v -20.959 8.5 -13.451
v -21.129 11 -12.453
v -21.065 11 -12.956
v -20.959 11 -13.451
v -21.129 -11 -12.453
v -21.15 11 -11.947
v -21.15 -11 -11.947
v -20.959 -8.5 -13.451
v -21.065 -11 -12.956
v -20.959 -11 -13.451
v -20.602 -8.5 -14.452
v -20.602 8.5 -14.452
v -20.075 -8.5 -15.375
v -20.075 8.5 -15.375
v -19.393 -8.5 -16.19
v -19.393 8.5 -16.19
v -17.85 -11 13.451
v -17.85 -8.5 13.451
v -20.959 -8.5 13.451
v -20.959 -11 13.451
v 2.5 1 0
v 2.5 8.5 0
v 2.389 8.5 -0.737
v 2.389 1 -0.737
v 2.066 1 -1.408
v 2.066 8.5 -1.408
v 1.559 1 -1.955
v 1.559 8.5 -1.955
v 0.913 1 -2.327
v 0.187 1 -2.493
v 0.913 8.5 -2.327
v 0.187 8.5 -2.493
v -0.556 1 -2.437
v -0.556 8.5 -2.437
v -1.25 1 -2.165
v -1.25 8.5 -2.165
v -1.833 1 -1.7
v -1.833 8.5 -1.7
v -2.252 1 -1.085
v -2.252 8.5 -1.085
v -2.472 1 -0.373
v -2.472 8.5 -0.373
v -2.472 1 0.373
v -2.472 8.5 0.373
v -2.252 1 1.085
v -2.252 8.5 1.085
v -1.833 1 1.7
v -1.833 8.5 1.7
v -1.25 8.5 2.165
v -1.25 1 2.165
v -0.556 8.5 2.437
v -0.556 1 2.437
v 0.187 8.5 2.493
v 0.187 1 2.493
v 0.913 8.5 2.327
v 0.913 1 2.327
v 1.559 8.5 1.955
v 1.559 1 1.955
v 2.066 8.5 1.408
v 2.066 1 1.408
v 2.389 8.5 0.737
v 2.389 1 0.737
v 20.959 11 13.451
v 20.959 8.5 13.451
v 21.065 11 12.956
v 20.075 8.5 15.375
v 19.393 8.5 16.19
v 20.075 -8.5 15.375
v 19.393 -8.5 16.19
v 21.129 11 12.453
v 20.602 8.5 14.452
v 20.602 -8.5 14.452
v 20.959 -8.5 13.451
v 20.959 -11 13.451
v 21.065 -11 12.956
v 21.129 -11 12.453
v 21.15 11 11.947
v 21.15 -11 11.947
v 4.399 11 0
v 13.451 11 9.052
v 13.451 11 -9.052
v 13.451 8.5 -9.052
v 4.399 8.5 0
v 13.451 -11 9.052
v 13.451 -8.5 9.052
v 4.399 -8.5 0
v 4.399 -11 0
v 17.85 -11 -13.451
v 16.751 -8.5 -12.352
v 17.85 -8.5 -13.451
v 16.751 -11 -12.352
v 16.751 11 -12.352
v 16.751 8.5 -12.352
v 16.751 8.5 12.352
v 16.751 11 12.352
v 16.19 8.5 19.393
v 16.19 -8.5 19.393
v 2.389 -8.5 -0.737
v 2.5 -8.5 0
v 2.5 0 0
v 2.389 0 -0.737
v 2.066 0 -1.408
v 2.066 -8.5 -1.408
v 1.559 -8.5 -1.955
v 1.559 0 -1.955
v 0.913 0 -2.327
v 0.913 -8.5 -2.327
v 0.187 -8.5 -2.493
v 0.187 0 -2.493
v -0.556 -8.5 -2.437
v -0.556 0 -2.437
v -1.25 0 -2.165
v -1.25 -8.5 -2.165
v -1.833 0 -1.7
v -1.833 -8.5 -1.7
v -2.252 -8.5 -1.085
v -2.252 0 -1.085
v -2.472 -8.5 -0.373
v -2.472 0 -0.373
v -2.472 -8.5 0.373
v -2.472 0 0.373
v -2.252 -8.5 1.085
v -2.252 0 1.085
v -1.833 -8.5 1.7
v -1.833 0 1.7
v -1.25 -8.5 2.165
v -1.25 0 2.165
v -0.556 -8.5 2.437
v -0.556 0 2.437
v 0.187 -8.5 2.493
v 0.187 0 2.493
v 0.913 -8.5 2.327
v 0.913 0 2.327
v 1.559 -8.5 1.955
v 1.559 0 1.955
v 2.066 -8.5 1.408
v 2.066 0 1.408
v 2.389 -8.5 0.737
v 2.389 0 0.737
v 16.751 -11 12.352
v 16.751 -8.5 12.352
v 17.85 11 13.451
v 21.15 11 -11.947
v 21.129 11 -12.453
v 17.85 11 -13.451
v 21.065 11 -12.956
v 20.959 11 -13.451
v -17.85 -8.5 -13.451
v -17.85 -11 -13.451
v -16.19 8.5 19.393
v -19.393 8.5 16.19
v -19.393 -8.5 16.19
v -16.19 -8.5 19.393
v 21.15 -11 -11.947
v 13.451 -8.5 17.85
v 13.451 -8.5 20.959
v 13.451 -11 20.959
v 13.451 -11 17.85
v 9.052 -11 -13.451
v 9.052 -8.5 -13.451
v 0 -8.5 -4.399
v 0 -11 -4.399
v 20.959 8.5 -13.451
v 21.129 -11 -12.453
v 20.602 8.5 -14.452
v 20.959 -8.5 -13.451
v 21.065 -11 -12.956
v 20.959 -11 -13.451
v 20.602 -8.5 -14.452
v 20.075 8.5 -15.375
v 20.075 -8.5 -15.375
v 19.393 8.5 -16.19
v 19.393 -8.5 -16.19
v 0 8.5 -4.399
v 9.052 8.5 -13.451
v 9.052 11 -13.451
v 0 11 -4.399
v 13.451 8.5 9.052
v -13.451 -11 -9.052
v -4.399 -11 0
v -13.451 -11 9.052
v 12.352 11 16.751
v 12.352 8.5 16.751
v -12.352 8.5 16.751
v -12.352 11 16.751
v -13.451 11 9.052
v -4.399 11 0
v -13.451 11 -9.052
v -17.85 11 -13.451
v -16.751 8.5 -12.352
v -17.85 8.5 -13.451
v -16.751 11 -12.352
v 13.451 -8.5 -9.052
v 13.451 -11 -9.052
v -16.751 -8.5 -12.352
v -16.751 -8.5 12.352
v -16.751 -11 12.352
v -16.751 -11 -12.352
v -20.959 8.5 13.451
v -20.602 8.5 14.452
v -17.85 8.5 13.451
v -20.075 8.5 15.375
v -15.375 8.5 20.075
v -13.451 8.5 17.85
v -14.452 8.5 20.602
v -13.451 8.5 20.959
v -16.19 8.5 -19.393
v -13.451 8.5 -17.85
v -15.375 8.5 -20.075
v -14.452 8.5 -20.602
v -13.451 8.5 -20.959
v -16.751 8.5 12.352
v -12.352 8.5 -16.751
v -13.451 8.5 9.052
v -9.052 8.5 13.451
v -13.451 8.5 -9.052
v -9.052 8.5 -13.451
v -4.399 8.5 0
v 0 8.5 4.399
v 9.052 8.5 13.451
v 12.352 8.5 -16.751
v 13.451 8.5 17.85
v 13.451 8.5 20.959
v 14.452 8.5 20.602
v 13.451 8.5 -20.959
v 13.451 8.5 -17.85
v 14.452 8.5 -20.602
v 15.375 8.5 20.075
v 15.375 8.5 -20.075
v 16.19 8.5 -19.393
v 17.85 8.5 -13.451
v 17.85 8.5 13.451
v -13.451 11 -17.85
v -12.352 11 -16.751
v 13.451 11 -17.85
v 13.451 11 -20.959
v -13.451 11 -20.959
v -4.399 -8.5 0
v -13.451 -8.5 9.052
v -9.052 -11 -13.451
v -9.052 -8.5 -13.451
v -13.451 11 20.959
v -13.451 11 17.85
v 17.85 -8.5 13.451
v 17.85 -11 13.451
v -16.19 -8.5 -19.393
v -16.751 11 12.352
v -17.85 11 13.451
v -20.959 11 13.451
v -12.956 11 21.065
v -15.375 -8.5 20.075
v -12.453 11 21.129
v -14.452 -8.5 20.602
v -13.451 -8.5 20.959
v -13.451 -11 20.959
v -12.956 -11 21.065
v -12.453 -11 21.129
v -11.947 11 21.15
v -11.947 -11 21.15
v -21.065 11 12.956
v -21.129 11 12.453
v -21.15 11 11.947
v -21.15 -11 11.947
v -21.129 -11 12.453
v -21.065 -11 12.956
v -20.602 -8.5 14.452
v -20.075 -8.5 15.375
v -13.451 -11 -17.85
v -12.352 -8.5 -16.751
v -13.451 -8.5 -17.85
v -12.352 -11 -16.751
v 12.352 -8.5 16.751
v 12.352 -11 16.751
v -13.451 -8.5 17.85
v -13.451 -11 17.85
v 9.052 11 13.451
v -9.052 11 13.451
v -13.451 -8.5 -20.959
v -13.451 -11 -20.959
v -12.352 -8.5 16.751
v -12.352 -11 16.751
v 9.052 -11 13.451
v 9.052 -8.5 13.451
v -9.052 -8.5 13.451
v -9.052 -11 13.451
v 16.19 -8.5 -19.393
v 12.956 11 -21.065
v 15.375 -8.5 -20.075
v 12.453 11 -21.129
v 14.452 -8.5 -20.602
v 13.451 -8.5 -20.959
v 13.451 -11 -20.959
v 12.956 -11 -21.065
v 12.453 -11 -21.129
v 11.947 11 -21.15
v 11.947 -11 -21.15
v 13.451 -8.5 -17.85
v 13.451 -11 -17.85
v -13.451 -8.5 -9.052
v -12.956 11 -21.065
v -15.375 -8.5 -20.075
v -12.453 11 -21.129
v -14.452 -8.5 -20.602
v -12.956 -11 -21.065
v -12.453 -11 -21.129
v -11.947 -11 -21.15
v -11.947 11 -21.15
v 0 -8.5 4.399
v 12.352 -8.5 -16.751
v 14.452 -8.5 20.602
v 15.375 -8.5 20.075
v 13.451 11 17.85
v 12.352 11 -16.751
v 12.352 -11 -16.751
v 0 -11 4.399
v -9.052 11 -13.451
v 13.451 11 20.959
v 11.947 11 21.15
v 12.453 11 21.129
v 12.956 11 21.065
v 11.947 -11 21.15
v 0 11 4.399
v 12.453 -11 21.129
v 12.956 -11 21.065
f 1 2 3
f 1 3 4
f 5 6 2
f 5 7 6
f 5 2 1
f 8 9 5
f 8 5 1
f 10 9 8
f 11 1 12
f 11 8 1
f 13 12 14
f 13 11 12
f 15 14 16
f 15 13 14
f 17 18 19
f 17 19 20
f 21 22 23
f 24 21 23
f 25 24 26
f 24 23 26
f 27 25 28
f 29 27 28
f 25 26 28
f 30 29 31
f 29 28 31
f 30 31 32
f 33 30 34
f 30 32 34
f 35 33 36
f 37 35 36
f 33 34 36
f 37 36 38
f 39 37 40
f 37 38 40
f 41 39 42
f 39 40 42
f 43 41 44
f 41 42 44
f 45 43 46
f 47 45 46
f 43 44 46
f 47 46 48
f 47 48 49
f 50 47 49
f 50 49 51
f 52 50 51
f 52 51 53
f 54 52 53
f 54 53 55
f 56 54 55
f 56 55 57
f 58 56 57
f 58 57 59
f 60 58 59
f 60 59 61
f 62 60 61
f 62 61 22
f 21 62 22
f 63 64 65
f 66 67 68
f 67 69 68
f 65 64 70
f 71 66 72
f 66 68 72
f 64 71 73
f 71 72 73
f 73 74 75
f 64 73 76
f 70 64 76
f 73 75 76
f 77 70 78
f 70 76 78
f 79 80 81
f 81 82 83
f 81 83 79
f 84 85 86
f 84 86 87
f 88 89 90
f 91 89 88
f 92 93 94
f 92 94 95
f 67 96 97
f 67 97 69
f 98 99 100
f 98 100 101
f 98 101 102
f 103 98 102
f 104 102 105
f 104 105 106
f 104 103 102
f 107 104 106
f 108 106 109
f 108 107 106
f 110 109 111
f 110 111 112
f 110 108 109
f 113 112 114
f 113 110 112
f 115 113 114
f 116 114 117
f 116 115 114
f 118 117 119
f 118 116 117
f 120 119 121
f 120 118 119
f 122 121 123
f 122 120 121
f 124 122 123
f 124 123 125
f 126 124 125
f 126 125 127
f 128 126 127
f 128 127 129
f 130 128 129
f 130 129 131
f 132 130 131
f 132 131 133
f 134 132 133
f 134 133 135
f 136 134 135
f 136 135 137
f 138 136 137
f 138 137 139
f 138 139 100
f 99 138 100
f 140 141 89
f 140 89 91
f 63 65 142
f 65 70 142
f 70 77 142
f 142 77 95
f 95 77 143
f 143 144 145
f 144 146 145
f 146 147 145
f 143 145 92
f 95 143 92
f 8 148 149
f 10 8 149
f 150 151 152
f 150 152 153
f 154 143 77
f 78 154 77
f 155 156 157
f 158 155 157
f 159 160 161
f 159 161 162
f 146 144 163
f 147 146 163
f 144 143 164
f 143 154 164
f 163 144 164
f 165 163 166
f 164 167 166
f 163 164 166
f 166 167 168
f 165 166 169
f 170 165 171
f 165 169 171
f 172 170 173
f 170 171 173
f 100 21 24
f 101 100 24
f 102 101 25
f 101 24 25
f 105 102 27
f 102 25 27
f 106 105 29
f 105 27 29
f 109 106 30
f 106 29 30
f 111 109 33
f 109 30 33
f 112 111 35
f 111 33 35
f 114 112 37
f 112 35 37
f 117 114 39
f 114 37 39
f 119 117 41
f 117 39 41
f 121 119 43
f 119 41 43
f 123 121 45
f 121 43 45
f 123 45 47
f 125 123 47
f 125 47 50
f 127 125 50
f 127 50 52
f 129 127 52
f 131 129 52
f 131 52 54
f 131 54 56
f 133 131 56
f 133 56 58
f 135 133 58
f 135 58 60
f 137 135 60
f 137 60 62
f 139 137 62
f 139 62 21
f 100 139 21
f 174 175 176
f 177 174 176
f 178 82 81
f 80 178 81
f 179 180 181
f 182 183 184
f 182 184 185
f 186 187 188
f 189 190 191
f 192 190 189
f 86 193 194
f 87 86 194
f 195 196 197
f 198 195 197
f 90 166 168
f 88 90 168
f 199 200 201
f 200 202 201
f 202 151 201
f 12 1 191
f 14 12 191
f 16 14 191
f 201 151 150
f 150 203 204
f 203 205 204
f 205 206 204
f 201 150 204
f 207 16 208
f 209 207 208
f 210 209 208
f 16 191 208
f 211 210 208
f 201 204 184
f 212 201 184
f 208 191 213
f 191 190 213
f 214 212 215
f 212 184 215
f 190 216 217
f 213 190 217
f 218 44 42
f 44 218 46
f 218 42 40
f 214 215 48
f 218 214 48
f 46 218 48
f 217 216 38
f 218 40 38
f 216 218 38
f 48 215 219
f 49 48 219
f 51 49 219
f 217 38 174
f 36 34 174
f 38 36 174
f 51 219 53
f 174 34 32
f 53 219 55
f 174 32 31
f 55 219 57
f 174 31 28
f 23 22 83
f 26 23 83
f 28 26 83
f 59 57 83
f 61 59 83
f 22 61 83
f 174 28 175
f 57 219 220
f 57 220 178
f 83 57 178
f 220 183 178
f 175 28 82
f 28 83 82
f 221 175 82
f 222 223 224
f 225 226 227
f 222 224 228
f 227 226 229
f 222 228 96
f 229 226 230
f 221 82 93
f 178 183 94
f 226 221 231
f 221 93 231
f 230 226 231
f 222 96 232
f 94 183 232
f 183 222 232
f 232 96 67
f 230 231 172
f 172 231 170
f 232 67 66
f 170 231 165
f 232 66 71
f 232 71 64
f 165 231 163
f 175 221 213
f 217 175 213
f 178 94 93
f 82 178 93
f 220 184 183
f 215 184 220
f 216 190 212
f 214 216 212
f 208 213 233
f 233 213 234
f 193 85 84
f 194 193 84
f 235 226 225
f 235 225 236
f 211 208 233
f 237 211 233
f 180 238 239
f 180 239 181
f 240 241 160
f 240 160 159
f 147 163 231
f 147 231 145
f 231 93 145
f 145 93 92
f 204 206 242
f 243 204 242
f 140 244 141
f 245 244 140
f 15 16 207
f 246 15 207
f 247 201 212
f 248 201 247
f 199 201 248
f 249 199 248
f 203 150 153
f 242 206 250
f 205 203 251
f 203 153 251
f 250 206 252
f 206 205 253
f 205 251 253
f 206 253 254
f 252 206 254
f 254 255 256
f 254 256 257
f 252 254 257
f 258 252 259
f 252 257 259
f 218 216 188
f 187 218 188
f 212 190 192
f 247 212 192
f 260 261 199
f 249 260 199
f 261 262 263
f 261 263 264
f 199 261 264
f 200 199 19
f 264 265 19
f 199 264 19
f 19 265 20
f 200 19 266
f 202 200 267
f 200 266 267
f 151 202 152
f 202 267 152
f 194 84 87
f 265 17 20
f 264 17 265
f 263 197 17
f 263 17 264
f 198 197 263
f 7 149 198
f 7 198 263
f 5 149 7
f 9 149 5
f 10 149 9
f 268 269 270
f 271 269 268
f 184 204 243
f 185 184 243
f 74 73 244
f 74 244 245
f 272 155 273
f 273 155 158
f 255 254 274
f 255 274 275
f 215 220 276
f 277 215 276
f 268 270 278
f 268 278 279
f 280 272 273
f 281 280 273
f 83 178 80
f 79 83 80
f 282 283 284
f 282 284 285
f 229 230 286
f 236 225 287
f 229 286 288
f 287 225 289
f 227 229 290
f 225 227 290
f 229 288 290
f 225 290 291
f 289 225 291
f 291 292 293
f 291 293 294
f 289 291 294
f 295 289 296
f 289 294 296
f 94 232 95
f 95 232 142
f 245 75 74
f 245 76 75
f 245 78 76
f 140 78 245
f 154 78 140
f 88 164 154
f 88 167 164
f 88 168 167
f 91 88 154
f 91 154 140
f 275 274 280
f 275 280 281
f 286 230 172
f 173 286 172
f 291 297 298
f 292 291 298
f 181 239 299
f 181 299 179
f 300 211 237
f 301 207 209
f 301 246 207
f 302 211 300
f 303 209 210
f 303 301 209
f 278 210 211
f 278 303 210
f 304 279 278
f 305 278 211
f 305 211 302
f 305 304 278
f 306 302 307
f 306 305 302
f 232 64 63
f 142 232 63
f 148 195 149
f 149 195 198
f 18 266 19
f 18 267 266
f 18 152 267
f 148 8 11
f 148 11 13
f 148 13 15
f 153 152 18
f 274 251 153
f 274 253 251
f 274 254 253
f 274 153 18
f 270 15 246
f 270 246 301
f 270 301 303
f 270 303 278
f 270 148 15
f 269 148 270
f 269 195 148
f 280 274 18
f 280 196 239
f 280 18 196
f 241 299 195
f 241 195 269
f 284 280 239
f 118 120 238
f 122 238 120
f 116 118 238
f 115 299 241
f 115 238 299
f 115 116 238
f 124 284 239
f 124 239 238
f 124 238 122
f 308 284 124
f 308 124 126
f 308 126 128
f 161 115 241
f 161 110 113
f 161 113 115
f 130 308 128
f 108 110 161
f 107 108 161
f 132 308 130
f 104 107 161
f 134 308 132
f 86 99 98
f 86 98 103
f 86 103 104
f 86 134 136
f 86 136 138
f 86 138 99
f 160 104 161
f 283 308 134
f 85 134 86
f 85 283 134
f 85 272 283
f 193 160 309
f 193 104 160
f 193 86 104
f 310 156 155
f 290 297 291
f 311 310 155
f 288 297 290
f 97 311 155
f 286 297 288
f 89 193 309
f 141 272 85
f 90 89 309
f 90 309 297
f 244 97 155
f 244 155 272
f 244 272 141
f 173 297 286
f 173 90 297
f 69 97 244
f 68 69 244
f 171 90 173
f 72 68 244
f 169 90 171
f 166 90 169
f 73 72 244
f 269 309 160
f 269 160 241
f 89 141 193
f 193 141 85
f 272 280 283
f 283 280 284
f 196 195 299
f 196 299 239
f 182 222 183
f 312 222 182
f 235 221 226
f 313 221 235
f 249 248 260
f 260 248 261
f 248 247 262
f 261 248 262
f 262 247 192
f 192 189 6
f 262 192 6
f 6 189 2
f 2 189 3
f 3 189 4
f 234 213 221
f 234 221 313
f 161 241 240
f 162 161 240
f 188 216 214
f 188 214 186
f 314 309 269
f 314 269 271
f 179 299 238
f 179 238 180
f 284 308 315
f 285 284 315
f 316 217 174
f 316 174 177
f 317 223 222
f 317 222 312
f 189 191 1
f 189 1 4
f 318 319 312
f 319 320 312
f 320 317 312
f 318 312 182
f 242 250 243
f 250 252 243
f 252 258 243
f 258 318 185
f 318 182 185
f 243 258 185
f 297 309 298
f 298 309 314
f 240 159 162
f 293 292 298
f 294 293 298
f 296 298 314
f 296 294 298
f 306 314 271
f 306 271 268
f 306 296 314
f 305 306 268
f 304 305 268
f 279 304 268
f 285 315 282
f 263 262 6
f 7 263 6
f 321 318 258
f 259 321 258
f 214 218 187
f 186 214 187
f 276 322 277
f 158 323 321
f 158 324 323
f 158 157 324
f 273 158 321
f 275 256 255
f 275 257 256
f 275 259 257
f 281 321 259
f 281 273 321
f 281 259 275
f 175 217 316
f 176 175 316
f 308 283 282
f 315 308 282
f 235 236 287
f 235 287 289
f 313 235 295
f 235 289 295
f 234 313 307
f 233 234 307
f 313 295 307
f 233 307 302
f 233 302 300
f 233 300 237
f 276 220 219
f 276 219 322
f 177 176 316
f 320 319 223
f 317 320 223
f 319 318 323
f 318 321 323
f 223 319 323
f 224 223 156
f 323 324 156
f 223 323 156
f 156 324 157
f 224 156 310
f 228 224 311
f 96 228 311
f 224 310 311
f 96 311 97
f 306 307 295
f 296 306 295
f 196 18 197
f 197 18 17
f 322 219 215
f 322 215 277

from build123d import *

# Parameters (mm, degrees)
BOSS_EXTRUDE1_DEPTH = 11
SKETCH18_W          = 3.3
SKETCH18_H          = 2.5
CUT_EXTRUDE10_DEPTH = 43.3
SKETCH19_W          = 3.3
SKETCH19_H          = 2.5
CUT_EXTRUDE11_DEPTH = 43.3
SKETCH20_W          = 6.221233688
SKETCH20_H          = 2.5
CUT_EXTRUDE12_DEPTH = 57.710616844
SKETCH21_W          = 6.221233688
SKETCH21_H          = 2.5
CUT_EXTRUDE13_DEPTH = 57.710616844
SKETCH22_R          = 2.5
CUT_EXTRUDE14_DEPTH = 9.5
CUT_EXTRUDE15_DEPTH = 20.5
FILLET8_R           = 6


with BuildPart() as part:
    # Sketch1 → Boss-Extrude1 (new body)
    with BuildSketch(Plane(origin=(0, 0, 0), x_dir=(1, 0, 0), z_dir=(0, 1, 0))):
        Polygon((-21.15, 16.750923472), (-16.750923472, 21.15), (16.750923472, 21.15), (21.15, 16.750923472), (21.15, -16.750923472), (16.750923472, -21.15), (-16.750923472, -21.15), (-21.15, -16.750923472), align=None)
    boss_extrude1 = extrude(amount=BOSS_EXTRUDE1_DEPTH)

    # Sketch18 → Cut-Extrude10 (cut, through all)
    with BuildSketch(Plane.XY.offset(21.15)):
        with Locations((15.100923472, 9.75)):
            Rectangle(SKETCH18_W, SKETCH18_H)
        with Locations((-15.100923472, 9.75)):
            Rectangle(SKETCH18_W, SKETCH18_H)
    cut_extrude10 = extrude(amount=-CUT_EXTRUDE10_DEPTH, mode=Mode.SUBTRACT)

    # Sketch19 → Cut-Extrude11 (cut, through all)
    with BuildSketch(Plane(origin=(21.15, 0, 0), x_dir=(0, 0, -1), z_dir=(1, 0, 0))):
        with Locations((-15.100923472, 9.75)):
            Rectangle(SKETCH19_W, SKETCH19_H)
        with Locations((15.100923472, 9.75)):
            Rectangle(SKETCH19_W, SKETCH19_H)
    cut_extrude11 = extrude(amount=-CUT_EXTRUDE11_DEPTH, mode=Mode.SUBTRACT)

    # Sketch20 → Cut-Extrude12 (cut, through all)
    with BuildSketch(Plane(origin=(18.950461736, 0, 18.950461736), x_dir=(0.707106781, 0, -0.707106781), z_dir=(0.707106781, 0, 0.707106781))):
        with Locations((0, 9.75)):
            Rectangle(SKETCH20_W, SKETCH20_H)
    cut_extrude12 = extrude(amount=-CUT_EXTRUDE12_DEPTH, mode=Mode.SUBTRACT)

    # Sketch21 → Cut-Extrude13 (cut, through all)
    with BuildSketch(Plane(origin=(-18.950461736, 0, 18.950461736), x_dir=(0.707106781, 0, 0.707106781), z_dir=(-0.707106781, 0, 0.707106781))):
        with Locations((0, 9.75)):
            Rectangle(SKETCH21_W, SKETCH21_H)
    cut_extrude13 = extrude(amount=-CUT_EXTRUDE13_DEPTH, mode=Mode.SUBTRACT)

    # Sketch22 → Cut-Extrude14 (cut, through all)
    with BuildSketch(Plane(origin=(0, 8.5, 0), x_dir=(1, 0, 0), z_dir=(0, 1, 0))):
        Circle(SKETCH22_R)
    cut_extrude14 = extrude(amount=-CUT_EXTRUDE14_DEPTH, mode=Mode.SUBTRACT)

    # Mirror1: Boss-Extrude1, Cut-Extrude10, Cut-Extrude11, Cut-Extrude12, Cut-Extrude13, Cut-Extrude14 across plane
    add(boss_extrude1.mirror(Plane(origin=(0, 0, 0), x_dir=(0, 0, 1), z_dir=(0, -1, 0))))
    add(cut_extrude10.mirror(Plane(origin=(0, 0, 0), x_dir=(0, 0, 1), z_dir=(0, -1, 0))), mode=Mode.SUBTRACT)
    add(cut_extrude11.mirror(Plane(origin=(0, 0, 0), x_dir=(0, 0, 1), z_dir=(0, -1, 0))), mode=Mode.SUBTRACT)
    add(cut_extrude12.mirror(Plane(origin=(0, 0, 0), x_dir=(0, 0, 1), z_dir=(0, -1, 0))), mode=Mode.SUBTRACT)
    add(cut_extrude13.mirror(Plane(origin=(0, 0, 0), x_dir=(0, 0, 1), z_dir=(0, -1, 0))), mode=Mode.SUBTRACT)
    add(cut_extrude14.mirror(Plane(origin=(0, 0, 0), x_dir=(0, 0, 1), z_dir=(0, -1, 0))), mode=Mode.SUBTRACT)

    # Sketch23 → Cut-Extrude15 (cut, through all)
    with BuildSketch(Plane(origin=(0, 8.5, 0), x_dir=(1, 0, 0), z_dir=(0, 1, 0))):
        Polygon((-21.15, -14.432485579), (-14.432485579, -21.15), (-16.750923472, -21.15), (-21.15, -16.750923472), align=None)
        Polygon((-21.15, 14.432485579), (-14.432485579, 21.15), (-16.750923472, 21.15), (-21.15, 16.750923472), align=None)
        Polygon((14.432485579, 21.15), (21.15, 14.432485579), (21.15, 16.750923472), (16.750923472, 21.15), align=None)
        Polygon((14.432485579, -21.15), (21.15, -14.432485579), (21.15, -16.750923472), (16.750923472, -21.15), align=None)
    extrude(amount=-CUT_EXTRUDE15_DEPTH, mode=Mode.SUBTRACT)

    # Fillet8
    fillet8_edges = [part.edges().sort_by_distance(p)[0] for p in [
        (14.432485579, 0, -21.15),
        (21.15, 0, -14.432485579),
        (-21.15, 0, -14.432485579),
        (-14.432485579, 0, -21.15),
        (-14.432485579, 0, 21.15),
        (-21.15, 0, 14.432485579),
        (21.15, 0, 14.432485579),
        (14.432485579, 0, 21.15),
    ]]
    fillet(fillet8_edges, radius=FILLET8_R)


solid = part.part
